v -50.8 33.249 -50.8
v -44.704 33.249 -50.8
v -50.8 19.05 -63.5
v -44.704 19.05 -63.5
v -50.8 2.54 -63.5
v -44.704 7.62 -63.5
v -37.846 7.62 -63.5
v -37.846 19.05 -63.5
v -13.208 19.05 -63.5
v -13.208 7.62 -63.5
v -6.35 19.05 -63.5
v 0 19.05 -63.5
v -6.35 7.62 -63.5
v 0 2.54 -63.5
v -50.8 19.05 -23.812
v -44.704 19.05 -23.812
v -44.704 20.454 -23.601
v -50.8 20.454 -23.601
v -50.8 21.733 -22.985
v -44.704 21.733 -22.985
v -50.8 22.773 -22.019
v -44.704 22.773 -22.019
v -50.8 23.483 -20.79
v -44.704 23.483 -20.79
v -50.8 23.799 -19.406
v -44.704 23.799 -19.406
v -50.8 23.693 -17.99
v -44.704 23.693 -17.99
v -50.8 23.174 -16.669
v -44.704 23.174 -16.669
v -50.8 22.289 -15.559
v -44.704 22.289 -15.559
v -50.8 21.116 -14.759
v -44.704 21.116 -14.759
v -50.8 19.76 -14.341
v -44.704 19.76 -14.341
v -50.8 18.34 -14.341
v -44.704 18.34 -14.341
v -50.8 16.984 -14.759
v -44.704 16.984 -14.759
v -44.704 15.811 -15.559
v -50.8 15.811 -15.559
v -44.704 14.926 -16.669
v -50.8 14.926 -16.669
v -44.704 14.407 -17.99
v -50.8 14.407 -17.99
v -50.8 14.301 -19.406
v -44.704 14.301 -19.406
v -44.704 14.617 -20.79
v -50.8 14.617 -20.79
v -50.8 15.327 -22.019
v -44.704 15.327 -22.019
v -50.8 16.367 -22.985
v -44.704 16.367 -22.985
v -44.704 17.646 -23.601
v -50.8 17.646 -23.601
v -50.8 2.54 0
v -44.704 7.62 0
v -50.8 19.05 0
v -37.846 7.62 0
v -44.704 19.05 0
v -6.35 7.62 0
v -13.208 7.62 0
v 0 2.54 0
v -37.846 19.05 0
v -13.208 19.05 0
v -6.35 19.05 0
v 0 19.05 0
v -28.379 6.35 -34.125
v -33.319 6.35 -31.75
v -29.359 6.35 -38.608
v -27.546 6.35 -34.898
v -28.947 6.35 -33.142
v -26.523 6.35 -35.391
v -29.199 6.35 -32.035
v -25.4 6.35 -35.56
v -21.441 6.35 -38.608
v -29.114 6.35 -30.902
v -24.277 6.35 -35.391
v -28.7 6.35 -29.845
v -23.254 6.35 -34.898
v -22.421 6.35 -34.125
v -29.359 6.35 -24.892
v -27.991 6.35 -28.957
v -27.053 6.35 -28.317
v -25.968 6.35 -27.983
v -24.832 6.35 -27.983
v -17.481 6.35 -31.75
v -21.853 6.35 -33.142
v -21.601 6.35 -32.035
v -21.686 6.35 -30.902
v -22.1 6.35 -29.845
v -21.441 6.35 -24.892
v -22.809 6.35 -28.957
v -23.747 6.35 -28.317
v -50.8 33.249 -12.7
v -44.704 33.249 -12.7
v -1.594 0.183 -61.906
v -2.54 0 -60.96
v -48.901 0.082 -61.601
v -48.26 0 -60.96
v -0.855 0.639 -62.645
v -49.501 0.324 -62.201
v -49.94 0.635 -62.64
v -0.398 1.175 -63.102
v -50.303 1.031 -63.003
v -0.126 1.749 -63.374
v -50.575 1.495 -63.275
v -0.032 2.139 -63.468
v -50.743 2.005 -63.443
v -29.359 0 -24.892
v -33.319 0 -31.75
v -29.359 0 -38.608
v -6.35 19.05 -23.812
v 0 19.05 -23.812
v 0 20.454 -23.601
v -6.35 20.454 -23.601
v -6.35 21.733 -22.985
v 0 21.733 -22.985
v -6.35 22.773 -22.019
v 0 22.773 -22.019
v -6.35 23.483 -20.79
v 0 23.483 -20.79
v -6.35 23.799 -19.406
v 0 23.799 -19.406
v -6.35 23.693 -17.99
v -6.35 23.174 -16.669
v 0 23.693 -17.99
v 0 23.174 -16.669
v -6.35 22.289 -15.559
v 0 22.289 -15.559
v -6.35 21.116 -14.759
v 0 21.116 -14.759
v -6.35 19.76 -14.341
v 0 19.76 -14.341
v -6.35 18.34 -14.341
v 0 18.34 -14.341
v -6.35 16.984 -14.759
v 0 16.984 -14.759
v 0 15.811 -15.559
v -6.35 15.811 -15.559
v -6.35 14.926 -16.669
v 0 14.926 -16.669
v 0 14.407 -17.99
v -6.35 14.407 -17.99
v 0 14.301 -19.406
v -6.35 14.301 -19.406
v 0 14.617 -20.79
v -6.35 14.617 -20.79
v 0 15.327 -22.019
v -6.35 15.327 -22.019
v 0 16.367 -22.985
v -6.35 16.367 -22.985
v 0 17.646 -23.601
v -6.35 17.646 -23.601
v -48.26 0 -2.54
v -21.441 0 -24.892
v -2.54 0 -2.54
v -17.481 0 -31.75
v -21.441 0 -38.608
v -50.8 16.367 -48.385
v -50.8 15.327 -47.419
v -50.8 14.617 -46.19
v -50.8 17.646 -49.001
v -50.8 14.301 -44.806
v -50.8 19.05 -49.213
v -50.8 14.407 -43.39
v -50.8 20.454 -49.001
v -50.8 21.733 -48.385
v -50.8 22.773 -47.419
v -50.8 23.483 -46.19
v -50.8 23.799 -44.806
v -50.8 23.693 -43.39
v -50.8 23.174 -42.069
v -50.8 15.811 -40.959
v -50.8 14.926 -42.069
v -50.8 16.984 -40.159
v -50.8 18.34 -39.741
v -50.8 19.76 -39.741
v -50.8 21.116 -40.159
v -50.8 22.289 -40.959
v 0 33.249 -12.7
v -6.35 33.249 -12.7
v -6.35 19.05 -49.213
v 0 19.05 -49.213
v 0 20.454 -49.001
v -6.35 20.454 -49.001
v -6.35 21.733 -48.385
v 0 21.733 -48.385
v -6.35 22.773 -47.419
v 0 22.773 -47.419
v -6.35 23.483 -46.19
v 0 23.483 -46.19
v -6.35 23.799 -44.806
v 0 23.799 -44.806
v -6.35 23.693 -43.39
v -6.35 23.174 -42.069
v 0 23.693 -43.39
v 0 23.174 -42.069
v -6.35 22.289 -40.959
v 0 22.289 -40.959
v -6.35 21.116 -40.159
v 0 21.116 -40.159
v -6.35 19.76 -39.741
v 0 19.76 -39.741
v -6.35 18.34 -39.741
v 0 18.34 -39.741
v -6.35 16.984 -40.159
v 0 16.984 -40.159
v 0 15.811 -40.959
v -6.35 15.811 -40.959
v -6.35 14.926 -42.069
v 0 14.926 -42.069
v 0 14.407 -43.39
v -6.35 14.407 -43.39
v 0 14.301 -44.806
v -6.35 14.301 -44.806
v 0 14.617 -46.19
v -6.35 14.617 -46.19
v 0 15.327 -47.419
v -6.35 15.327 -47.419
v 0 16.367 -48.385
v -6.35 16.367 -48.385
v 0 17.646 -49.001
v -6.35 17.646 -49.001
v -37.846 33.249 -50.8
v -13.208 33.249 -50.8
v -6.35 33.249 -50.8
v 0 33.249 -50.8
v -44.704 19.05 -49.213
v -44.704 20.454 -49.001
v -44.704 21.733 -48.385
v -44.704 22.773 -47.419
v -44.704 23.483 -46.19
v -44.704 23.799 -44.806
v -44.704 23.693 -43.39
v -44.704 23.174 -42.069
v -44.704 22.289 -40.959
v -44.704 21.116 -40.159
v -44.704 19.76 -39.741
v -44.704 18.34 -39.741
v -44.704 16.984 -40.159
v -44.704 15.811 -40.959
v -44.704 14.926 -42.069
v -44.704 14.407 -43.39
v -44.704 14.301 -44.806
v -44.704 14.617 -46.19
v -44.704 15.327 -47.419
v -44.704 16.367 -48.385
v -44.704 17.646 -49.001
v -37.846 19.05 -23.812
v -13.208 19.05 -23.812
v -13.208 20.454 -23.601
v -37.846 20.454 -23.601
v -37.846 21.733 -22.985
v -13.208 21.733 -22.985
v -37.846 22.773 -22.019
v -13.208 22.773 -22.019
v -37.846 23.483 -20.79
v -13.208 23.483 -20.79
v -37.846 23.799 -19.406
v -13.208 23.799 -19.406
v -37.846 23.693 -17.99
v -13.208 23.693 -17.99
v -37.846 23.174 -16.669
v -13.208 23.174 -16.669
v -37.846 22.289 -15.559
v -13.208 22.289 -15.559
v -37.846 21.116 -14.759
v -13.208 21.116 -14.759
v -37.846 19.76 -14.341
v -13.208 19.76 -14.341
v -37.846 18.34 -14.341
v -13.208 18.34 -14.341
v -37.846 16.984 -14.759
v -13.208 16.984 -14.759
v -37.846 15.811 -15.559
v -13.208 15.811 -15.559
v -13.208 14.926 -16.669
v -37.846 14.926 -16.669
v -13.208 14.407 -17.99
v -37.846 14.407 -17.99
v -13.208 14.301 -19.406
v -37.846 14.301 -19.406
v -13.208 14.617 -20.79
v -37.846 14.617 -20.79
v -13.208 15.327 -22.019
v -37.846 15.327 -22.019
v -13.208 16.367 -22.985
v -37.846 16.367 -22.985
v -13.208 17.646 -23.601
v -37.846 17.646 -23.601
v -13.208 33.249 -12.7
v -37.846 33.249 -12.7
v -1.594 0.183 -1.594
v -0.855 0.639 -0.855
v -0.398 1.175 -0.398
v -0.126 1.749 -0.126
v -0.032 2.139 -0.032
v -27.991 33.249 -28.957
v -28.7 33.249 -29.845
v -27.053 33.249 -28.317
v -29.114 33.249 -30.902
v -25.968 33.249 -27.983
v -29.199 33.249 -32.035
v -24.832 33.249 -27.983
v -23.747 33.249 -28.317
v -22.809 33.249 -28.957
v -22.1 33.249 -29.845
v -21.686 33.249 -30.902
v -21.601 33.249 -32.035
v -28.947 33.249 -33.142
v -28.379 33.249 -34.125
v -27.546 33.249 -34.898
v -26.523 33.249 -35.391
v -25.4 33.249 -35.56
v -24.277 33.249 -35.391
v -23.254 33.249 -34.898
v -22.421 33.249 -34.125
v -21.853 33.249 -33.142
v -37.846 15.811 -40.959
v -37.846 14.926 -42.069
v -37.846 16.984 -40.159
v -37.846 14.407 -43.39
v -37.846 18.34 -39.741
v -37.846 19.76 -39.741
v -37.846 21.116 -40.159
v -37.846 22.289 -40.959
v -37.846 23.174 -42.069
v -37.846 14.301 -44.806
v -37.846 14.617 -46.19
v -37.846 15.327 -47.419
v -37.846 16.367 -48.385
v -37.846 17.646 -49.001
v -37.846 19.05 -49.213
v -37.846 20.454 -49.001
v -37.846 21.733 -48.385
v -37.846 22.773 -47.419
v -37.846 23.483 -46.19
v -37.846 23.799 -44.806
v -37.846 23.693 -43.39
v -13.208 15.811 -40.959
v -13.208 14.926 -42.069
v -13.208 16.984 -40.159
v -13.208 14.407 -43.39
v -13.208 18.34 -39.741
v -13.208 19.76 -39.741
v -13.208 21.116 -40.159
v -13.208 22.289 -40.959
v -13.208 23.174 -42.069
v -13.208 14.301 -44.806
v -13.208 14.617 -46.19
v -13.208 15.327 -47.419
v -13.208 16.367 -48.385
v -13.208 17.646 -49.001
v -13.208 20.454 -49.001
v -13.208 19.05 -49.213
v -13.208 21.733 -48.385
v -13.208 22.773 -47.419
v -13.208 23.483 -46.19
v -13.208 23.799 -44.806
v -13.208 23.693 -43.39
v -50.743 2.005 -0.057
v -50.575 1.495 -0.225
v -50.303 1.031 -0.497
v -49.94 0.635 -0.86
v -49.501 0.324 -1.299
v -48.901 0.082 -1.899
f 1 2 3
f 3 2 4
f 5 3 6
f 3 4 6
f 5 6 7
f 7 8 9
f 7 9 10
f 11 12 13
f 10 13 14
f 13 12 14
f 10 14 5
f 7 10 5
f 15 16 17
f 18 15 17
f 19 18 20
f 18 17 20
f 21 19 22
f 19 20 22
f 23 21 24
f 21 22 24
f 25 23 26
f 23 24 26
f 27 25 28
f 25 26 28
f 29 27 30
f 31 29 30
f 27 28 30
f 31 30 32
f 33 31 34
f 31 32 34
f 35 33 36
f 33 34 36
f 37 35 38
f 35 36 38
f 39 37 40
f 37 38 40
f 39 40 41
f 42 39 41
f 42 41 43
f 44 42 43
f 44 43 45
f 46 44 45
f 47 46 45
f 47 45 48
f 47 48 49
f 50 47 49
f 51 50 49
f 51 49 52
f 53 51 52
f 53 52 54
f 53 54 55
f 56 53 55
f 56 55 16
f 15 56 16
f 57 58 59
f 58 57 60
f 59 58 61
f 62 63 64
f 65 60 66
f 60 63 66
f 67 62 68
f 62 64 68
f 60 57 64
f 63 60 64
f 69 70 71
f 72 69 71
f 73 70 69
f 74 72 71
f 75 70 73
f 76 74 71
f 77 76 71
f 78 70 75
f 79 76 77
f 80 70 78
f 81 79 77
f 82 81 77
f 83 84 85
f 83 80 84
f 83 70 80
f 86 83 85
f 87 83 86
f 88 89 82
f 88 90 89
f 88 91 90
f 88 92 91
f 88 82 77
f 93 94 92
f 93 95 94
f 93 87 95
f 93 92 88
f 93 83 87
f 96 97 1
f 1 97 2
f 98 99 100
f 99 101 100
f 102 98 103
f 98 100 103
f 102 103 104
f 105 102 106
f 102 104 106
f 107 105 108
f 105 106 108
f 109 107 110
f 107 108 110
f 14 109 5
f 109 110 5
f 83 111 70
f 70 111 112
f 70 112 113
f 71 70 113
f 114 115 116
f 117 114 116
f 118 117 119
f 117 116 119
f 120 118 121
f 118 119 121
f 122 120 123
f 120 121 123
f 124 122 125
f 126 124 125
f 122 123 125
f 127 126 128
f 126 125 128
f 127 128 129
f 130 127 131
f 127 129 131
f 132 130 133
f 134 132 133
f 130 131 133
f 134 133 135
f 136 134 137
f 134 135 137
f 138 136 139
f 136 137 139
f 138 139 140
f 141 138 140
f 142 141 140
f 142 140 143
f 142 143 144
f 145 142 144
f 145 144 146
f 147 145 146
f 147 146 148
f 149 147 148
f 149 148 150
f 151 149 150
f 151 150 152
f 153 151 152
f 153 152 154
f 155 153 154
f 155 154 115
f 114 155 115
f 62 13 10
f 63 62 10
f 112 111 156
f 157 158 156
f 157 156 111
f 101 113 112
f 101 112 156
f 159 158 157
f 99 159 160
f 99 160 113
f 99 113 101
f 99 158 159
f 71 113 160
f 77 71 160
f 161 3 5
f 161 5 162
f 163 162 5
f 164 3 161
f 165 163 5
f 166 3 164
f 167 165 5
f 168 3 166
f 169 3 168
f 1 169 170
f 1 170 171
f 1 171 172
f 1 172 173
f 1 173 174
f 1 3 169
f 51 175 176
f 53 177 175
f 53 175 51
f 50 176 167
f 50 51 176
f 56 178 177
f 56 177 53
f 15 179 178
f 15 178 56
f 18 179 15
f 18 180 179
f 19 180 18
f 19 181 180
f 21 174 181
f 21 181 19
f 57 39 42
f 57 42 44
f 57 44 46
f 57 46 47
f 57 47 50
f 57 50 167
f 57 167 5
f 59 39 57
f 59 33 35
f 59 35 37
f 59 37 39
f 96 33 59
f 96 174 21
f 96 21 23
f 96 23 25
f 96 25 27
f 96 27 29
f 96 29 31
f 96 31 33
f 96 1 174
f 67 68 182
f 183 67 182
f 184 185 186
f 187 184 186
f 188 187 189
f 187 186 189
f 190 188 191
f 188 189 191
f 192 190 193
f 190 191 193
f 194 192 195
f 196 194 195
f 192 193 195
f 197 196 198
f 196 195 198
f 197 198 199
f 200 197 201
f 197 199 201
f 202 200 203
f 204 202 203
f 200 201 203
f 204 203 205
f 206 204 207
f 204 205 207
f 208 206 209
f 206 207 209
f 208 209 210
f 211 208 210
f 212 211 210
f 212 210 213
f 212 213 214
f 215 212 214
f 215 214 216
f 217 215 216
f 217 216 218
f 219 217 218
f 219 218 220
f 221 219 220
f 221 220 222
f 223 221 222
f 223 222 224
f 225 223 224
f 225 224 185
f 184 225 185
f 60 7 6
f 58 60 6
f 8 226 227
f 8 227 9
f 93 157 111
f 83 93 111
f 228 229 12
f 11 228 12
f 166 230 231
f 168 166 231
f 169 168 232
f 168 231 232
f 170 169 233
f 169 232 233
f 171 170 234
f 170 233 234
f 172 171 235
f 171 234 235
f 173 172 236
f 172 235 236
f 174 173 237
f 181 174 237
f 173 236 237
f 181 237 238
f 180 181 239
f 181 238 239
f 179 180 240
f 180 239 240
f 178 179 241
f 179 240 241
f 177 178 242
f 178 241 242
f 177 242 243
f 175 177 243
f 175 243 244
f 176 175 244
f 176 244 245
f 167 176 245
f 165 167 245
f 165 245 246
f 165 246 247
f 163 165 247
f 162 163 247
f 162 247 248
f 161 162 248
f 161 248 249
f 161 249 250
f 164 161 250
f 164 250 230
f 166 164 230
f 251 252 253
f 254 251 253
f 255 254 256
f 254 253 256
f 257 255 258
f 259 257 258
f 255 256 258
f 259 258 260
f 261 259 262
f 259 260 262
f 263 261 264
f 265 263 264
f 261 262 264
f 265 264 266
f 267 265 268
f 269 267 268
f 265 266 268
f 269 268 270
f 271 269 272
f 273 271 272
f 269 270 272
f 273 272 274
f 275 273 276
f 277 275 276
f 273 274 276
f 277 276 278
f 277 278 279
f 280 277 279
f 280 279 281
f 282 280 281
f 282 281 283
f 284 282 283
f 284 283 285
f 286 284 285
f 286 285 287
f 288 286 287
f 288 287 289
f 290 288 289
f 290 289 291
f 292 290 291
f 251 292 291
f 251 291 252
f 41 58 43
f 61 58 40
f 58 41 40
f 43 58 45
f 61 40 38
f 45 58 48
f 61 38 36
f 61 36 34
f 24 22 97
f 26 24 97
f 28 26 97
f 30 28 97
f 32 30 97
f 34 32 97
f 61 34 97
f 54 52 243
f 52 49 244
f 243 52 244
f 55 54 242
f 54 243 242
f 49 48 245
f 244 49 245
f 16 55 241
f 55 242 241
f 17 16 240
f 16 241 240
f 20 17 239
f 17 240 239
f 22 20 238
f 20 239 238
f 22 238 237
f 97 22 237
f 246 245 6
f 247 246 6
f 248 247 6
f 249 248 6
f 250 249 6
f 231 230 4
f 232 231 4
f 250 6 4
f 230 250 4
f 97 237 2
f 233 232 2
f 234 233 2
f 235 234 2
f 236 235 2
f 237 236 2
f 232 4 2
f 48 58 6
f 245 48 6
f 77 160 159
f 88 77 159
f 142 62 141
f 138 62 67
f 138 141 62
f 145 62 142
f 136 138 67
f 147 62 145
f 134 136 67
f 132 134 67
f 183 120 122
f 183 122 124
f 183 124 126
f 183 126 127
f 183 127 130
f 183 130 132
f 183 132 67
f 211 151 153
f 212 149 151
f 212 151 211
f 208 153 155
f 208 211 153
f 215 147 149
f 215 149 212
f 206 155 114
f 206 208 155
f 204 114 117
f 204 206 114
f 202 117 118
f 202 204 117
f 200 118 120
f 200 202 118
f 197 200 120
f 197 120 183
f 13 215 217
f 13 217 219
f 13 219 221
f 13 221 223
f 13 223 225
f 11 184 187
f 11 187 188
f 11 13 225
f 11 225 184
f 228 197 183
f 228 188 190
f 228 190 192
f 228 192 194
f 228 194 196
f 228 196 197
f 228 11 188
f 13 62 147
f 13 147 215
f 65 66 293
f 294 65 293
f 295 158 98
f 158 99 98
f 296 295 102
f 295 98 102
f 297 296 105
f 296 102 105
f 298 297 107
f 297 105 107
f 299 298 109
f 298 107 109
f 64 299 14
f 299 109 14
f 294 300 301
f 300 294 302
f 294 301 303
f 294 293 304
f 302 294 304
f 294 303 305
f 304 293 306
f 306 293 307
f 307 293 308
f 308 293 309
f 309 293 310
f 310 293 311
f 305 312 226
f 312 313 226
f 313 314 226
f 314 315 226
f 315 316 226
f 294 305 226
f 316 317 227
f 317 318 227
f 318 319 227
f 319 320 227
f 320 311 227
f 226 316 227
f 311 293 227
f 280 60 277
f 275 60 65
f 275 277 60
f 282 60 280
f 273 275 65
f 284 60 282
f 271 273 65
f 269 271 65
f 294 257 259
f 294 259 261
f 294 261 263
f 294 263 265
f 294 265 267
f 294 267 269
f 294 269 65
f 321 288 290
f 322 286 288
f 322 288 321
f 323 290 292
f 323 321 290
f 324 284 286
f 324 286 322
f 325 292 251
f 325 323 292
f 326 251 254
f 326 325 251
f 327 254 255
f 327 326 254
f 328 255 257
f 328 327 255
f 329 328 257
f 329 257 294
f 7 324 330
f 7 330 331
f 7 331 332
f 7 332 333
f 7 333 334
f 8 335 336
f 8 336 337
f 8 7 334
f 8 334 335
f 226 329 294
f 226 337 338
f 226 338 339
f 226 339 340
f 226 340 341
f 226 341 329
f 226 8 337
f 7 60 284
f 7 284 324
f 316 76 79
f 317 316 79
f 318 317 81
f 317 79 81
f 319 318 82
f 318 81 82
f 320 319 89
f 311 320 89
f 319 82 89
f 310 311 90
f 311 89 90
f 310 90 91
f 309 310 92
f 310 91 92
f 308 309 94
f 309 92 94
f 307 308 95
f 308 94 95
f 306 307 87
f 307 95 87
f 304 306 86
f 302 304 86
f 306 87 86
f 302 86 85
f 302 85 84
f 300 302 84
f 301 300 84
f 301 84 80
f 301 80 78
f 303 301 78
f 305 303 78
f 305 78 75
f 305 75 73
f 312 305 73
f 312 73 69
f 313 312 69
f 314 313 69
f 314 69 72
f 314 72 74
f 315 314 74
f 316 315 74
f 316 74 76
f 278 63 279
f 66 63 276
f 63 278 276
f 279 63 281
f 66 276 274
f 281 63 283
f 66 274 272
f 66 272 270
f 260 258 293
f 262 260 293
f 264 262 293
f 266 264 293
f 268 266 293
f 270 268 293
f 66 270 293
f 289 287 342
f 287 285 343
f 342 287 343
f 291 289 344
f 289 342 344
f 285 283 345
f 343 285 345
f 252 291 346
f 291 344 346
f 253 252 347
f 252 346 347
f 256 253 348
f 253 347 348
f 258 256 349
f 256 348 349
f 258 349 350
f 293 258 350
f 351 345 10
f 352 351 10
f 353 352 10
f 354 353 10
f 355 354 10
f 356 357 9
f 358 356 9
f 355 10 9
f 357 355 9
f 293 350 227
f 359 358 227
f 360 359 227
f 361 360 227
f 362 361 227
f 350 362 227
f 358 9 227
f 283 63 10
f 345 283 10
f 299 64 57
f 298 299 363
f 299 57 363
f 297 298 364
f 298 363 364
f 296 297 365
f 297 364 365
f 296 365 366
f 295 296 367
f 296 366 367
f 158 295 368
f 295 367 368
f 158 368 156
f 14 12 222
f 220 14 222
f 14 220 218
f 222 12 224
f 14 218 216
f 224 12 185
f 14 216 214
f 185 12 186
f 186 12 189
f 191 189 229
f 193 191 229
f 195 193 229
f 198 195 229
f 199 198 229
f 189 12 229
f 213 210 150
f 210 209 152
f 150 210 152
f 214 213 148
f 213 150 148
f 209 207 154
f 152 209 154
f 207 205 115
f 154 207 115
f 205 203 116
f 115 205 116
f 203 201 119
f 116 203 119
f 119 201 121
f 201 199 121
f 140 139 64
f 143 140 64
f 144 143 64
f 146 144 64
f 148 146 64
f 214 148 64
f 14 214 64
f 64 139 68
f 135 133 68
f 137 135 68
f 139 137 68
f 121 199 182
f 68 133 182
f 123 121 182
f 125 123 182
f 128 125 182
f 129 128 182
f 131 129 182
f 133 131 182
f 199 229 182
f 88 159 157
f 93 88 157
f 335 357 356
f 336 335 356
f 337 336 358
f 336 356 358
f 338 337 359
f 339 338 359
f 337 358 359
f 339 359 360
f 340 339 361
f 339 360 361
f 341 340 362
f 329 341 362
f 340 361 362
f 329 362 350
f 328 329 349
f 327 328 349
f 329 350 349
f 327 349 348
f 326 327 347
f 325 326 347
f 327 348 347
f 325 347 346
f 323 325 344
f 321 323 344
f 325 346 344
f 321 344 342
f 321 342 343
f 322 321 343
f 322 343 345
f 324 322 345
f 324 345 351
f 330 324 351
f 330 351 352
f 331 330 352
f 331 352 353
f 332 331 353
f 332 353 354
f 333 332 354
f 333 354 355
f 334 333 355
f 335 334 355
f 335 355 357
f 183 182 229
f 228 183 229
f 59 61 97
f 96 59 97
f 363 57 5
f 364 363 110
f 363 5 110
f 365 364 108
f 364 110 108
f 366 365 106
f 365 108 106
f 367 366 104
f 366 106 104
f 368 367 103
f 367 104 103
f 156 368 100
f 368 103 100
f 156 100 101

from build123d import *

# Parameters (mm, degrees)
SKETCH1_W           = 63.5
SKETCH1_H           = 6.35
BOSS_EXTRUDE1_DEPTH = 50.8
BOSS_EXTRUDE2_DEPTH = 50.8
SKETCH10_W          = 6.858
SKETCH10_H          = 25.629031657
CUT_EXTRUDE1_DEPTH  = 88.854357354
LPATTERN3_COUNT     = 2
LPATTERN3_PITCH     = 31.496
SKETCH11_R          = 4.7625
CUT_EXTRUDE2_DEPTH  = 88.854357354
FILLET1_R           = 2.54
SKETCH24_R          = 3.81
CUT_EXTRUDE10_DEPTH = 88.854357354
CUT_EXTRUDE11_DEPTH = 6.35


with BuildPart() as part:
    # Sketch1 → Boss-Extrude1 (new body)
    with BuildSketch(Plane(origin=(0, 0, 0), x_dir=(0, 0, -1), z_dir=(1, 0, 0))):
        with Locations((31.75, 3.175)):
            Rectangle(SKETCH1_W, SKETCH1_H)
    extrude(amount=-BOSS_EXTRUDE1_DEPTH)

    # Sketch2 → Boss-Extrude2 (add)
    with BuildSketch(Plane(origin=(0, 0, 0), x_dir=(0, 0, -1), z_dir=(1, 0, 0))):
        Polygon((0, 6.35), (0, 19.05), (12.7, 33.249031657), (50.8, 33.249031657), (63.5, 19.05), (63.5, 6.35), align=None)
    extrude(amount=-BOSS_EXTRUDE2_DEPTH)

    # Sketch10 → Cut-Extrude1 (cut, through all)
    with BuildSketch(Plane(origin=(0, 0, -63.5), x_dir=(-1, 0, 0), z_dir=(0, 0, -1))):
        with Locations((9.779, 20.434515829)):
            Rectangle(SKETCH10_W, SKETCH10_H)
    cut_extrude1 = extrude(amount=-CUT_EXTRUDE1_DEPTH, mode=Mode.SUBTRACT)

    # LPattern3: Cut-Extrude1 ×2
    with Locations(*[(-i * LPATTERN3_PITCH, 0, 0) for i in range(1, LPATTERN3_COUNT)]):
        add(cut_extrude1, mode=Mode.SUBTRACT)

    # Sketch11 → Cut-Extrude2 (cut, through all)
    with BuildSketch(Plane(origin=(0, 0, 0), x_dir=(0, 0, -1), z_dir=(1, 0, 0))):
        with Locations((19.05, 19.05)):
            Circle(SKETCH11_R)
        with Locations((44.45, 19.05)):
            Circle(SKETCH11_R)
    extrude(amount=-CUT_EXTRUDE2_DEPTH, mode=Mode.SUBTRACT)

    # Fillet1
    fillet1_edges = [part.edges().sort_by_distance(p)[0] for p in [
        (0, 0, -31.75),
        (-50.8, 0, -31.75),
        (-25.4, 0, -63.5),
        (-25.4, 0, 0),
    ]]
    fillet(fillet1_edges, radius=FILLET1_R)

    # Sketch24 → Cut-Extrude10 (cut, through all)
    with BuildSketch(Plane.XZ):
        with Locations(Location((-25.4, -31.75, 0), (0, 0, 270))):
            Circle(SKETCH24_R)
    extrude(amount=-CUT_EXTRUDE10_DEPTH, mode=Mode.SUBTRACT)

    # Sketch25 → Cut-Extrude11 (cut)
    with BuildSketch(Plane.XZ):
        Polygon((-29.359468146, -24.892), (-33.318936292, -31.75), (-29.359468146, -38.608), (-21.440531854, -38.608), (-17.481063708, -31.75), (-21.440531854, -24.892), align=None)
    extrude(amount=-CUT_EXTRUDE11_DEPTH, mode=Mode.SUBTRACT)


solid = part.part
